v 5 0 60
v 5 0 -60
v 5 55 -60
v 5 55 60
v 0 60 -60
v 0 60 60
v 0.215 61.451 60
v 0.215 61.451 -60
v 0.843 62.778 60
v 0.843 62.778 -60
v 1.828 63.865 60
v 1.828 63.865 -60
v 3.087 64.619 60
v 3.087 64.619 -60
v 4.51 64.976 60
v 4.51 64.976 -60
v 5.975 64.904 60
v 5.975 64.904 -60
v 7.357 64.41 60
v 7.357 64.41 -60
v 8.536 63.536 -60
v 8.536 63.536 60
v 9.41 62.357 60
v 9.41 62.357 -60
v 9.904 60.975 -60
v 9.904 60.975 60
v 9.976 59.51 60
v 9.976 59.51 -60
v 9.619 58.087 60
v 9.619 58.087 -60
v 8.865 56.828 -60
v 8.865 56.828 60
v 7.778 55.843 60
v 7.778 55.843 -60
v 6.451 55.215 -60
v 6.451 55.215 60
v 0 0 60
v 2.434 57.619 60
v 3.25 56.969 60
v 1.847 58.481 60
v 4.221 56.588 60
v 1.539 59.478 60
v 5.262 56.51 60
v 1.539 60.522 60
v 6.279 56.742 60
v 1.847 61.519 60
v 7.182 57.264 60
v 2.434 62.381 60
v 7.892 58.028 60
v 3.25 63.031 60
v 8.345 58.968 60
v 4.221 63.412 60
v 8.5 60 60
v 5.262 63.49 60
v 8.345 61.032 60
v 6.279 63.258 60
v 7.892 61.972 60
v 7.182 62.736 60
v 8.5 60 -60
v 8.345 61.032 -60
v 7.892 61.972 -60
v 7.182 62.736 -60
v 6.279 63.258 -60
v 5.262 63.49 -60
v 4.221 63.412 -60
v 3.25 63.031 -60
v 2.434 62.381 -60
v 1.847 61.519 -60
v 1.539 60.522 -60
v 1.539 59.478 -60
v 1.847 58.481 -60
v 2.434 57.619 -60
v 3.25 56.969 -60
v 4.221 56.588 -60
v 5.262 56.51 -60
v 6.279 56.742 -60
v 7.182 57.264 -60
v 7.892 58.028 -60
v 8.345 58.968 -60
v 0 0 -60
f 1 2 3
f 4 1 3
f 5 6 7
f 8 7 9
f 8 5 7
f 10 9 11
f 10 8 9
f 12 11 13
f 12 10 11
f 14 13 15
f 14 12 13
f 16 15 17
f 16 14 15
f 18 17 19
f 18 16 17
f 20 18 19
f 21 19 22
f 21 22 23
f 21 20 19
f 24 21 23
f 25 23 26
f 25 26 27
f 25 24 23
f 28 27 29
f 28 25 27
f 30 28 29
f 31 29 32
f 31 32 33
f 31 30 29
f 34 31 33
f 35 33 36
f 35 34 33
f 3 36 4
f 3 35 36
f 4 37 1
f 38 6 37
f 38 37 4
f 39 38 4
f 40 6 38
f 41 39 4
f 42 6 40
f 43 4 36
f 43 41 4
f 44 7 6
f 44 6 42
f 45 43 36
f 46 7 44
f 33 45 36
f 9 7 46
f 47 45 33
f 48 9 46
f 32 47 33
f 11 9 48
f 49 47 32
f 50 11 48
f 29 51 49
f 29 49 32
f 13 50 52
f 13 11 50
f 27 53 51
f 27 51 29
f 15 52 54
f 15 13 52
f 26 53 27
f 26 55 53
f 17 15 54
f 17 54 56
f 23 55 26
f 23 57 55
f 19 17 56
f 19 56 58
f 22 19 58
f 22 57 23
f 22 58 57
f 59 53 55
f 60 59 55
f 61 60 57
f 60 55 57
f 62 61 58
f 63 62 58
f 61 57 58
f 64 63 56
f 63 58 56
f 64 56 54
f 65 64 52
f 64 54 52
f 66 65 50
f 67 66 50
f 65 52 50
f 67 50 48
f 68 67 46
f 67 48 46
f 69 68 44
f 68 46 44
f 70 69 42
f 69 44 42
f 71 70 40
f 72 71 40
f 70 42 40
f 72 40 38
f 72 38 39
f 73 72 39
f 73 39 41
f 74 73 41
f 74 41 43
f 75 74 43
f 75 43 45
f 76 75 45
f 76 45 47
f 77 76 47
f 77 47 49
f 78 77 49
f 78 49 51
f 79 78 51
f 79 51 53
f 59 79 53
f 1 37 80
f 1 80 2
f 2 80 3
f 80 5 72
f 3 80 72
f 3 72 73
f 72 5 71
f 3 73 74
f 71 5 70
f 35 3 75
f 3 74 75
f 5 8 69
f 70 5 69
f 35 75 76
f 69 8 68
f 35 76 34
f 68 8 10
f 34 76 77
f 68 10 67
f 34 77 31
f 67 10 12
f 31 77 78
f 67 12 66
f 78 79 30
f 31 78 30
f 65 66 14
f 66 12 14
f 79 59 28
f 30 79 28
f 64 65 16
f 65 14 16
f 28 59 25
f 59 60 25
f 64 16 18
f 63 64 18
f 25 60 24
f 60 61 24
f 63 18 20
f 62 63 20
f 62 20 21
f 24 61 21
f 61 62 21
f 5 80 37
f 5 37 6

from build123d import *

# Parameters (mm, degrees)
SKETCH_1_W          = 5
SKETCH_1_H          = 60
EXTRUDE_1_DEPTH     = 60
SKETCH_2_R          = 5
SKETCH_3_R          = 3.5
CUT_EXTRUDE_4_DEPTH = 137.839321834


with BuildPart() as part:
    # Эскиз1 → Вытянуть-Тонкостенный1 (new, symmetric)
    with BuildSketch(Plane.XY):
        with Locations((2.5, 30)):
            Rectangle(SKETCH_1_W, SKETCH_1_H)
    extrude(amount=EXTRUDE_1_DEPTH, both=True)

    # По траектории1: sweep along a curve in space
    with BuildLine() as sweep_1_path:
        Line((5, 60, 60), (5, 60, -60))
    # Эскиз2 → По траектории1 (sweep)
    with BuildSketch(Plane.XY.offset(60)):
        with Locations((5, 60)):
            Circle(SKETCH_2_R)
    sweep(path=sweep_1_path.line)

    # Эскиз3 → Вырез-Вытянуть4 (cut, through all)
    with BuildSketch(Plane.XY.offset(60)):
        with Locations((5, 60)):
            Circle(SKETCH_3_R)
    extrude(amount=-CUT_EXTRUDE_4_DEPTH, mode=Mode.SUBTRACT)


solid = part.part
